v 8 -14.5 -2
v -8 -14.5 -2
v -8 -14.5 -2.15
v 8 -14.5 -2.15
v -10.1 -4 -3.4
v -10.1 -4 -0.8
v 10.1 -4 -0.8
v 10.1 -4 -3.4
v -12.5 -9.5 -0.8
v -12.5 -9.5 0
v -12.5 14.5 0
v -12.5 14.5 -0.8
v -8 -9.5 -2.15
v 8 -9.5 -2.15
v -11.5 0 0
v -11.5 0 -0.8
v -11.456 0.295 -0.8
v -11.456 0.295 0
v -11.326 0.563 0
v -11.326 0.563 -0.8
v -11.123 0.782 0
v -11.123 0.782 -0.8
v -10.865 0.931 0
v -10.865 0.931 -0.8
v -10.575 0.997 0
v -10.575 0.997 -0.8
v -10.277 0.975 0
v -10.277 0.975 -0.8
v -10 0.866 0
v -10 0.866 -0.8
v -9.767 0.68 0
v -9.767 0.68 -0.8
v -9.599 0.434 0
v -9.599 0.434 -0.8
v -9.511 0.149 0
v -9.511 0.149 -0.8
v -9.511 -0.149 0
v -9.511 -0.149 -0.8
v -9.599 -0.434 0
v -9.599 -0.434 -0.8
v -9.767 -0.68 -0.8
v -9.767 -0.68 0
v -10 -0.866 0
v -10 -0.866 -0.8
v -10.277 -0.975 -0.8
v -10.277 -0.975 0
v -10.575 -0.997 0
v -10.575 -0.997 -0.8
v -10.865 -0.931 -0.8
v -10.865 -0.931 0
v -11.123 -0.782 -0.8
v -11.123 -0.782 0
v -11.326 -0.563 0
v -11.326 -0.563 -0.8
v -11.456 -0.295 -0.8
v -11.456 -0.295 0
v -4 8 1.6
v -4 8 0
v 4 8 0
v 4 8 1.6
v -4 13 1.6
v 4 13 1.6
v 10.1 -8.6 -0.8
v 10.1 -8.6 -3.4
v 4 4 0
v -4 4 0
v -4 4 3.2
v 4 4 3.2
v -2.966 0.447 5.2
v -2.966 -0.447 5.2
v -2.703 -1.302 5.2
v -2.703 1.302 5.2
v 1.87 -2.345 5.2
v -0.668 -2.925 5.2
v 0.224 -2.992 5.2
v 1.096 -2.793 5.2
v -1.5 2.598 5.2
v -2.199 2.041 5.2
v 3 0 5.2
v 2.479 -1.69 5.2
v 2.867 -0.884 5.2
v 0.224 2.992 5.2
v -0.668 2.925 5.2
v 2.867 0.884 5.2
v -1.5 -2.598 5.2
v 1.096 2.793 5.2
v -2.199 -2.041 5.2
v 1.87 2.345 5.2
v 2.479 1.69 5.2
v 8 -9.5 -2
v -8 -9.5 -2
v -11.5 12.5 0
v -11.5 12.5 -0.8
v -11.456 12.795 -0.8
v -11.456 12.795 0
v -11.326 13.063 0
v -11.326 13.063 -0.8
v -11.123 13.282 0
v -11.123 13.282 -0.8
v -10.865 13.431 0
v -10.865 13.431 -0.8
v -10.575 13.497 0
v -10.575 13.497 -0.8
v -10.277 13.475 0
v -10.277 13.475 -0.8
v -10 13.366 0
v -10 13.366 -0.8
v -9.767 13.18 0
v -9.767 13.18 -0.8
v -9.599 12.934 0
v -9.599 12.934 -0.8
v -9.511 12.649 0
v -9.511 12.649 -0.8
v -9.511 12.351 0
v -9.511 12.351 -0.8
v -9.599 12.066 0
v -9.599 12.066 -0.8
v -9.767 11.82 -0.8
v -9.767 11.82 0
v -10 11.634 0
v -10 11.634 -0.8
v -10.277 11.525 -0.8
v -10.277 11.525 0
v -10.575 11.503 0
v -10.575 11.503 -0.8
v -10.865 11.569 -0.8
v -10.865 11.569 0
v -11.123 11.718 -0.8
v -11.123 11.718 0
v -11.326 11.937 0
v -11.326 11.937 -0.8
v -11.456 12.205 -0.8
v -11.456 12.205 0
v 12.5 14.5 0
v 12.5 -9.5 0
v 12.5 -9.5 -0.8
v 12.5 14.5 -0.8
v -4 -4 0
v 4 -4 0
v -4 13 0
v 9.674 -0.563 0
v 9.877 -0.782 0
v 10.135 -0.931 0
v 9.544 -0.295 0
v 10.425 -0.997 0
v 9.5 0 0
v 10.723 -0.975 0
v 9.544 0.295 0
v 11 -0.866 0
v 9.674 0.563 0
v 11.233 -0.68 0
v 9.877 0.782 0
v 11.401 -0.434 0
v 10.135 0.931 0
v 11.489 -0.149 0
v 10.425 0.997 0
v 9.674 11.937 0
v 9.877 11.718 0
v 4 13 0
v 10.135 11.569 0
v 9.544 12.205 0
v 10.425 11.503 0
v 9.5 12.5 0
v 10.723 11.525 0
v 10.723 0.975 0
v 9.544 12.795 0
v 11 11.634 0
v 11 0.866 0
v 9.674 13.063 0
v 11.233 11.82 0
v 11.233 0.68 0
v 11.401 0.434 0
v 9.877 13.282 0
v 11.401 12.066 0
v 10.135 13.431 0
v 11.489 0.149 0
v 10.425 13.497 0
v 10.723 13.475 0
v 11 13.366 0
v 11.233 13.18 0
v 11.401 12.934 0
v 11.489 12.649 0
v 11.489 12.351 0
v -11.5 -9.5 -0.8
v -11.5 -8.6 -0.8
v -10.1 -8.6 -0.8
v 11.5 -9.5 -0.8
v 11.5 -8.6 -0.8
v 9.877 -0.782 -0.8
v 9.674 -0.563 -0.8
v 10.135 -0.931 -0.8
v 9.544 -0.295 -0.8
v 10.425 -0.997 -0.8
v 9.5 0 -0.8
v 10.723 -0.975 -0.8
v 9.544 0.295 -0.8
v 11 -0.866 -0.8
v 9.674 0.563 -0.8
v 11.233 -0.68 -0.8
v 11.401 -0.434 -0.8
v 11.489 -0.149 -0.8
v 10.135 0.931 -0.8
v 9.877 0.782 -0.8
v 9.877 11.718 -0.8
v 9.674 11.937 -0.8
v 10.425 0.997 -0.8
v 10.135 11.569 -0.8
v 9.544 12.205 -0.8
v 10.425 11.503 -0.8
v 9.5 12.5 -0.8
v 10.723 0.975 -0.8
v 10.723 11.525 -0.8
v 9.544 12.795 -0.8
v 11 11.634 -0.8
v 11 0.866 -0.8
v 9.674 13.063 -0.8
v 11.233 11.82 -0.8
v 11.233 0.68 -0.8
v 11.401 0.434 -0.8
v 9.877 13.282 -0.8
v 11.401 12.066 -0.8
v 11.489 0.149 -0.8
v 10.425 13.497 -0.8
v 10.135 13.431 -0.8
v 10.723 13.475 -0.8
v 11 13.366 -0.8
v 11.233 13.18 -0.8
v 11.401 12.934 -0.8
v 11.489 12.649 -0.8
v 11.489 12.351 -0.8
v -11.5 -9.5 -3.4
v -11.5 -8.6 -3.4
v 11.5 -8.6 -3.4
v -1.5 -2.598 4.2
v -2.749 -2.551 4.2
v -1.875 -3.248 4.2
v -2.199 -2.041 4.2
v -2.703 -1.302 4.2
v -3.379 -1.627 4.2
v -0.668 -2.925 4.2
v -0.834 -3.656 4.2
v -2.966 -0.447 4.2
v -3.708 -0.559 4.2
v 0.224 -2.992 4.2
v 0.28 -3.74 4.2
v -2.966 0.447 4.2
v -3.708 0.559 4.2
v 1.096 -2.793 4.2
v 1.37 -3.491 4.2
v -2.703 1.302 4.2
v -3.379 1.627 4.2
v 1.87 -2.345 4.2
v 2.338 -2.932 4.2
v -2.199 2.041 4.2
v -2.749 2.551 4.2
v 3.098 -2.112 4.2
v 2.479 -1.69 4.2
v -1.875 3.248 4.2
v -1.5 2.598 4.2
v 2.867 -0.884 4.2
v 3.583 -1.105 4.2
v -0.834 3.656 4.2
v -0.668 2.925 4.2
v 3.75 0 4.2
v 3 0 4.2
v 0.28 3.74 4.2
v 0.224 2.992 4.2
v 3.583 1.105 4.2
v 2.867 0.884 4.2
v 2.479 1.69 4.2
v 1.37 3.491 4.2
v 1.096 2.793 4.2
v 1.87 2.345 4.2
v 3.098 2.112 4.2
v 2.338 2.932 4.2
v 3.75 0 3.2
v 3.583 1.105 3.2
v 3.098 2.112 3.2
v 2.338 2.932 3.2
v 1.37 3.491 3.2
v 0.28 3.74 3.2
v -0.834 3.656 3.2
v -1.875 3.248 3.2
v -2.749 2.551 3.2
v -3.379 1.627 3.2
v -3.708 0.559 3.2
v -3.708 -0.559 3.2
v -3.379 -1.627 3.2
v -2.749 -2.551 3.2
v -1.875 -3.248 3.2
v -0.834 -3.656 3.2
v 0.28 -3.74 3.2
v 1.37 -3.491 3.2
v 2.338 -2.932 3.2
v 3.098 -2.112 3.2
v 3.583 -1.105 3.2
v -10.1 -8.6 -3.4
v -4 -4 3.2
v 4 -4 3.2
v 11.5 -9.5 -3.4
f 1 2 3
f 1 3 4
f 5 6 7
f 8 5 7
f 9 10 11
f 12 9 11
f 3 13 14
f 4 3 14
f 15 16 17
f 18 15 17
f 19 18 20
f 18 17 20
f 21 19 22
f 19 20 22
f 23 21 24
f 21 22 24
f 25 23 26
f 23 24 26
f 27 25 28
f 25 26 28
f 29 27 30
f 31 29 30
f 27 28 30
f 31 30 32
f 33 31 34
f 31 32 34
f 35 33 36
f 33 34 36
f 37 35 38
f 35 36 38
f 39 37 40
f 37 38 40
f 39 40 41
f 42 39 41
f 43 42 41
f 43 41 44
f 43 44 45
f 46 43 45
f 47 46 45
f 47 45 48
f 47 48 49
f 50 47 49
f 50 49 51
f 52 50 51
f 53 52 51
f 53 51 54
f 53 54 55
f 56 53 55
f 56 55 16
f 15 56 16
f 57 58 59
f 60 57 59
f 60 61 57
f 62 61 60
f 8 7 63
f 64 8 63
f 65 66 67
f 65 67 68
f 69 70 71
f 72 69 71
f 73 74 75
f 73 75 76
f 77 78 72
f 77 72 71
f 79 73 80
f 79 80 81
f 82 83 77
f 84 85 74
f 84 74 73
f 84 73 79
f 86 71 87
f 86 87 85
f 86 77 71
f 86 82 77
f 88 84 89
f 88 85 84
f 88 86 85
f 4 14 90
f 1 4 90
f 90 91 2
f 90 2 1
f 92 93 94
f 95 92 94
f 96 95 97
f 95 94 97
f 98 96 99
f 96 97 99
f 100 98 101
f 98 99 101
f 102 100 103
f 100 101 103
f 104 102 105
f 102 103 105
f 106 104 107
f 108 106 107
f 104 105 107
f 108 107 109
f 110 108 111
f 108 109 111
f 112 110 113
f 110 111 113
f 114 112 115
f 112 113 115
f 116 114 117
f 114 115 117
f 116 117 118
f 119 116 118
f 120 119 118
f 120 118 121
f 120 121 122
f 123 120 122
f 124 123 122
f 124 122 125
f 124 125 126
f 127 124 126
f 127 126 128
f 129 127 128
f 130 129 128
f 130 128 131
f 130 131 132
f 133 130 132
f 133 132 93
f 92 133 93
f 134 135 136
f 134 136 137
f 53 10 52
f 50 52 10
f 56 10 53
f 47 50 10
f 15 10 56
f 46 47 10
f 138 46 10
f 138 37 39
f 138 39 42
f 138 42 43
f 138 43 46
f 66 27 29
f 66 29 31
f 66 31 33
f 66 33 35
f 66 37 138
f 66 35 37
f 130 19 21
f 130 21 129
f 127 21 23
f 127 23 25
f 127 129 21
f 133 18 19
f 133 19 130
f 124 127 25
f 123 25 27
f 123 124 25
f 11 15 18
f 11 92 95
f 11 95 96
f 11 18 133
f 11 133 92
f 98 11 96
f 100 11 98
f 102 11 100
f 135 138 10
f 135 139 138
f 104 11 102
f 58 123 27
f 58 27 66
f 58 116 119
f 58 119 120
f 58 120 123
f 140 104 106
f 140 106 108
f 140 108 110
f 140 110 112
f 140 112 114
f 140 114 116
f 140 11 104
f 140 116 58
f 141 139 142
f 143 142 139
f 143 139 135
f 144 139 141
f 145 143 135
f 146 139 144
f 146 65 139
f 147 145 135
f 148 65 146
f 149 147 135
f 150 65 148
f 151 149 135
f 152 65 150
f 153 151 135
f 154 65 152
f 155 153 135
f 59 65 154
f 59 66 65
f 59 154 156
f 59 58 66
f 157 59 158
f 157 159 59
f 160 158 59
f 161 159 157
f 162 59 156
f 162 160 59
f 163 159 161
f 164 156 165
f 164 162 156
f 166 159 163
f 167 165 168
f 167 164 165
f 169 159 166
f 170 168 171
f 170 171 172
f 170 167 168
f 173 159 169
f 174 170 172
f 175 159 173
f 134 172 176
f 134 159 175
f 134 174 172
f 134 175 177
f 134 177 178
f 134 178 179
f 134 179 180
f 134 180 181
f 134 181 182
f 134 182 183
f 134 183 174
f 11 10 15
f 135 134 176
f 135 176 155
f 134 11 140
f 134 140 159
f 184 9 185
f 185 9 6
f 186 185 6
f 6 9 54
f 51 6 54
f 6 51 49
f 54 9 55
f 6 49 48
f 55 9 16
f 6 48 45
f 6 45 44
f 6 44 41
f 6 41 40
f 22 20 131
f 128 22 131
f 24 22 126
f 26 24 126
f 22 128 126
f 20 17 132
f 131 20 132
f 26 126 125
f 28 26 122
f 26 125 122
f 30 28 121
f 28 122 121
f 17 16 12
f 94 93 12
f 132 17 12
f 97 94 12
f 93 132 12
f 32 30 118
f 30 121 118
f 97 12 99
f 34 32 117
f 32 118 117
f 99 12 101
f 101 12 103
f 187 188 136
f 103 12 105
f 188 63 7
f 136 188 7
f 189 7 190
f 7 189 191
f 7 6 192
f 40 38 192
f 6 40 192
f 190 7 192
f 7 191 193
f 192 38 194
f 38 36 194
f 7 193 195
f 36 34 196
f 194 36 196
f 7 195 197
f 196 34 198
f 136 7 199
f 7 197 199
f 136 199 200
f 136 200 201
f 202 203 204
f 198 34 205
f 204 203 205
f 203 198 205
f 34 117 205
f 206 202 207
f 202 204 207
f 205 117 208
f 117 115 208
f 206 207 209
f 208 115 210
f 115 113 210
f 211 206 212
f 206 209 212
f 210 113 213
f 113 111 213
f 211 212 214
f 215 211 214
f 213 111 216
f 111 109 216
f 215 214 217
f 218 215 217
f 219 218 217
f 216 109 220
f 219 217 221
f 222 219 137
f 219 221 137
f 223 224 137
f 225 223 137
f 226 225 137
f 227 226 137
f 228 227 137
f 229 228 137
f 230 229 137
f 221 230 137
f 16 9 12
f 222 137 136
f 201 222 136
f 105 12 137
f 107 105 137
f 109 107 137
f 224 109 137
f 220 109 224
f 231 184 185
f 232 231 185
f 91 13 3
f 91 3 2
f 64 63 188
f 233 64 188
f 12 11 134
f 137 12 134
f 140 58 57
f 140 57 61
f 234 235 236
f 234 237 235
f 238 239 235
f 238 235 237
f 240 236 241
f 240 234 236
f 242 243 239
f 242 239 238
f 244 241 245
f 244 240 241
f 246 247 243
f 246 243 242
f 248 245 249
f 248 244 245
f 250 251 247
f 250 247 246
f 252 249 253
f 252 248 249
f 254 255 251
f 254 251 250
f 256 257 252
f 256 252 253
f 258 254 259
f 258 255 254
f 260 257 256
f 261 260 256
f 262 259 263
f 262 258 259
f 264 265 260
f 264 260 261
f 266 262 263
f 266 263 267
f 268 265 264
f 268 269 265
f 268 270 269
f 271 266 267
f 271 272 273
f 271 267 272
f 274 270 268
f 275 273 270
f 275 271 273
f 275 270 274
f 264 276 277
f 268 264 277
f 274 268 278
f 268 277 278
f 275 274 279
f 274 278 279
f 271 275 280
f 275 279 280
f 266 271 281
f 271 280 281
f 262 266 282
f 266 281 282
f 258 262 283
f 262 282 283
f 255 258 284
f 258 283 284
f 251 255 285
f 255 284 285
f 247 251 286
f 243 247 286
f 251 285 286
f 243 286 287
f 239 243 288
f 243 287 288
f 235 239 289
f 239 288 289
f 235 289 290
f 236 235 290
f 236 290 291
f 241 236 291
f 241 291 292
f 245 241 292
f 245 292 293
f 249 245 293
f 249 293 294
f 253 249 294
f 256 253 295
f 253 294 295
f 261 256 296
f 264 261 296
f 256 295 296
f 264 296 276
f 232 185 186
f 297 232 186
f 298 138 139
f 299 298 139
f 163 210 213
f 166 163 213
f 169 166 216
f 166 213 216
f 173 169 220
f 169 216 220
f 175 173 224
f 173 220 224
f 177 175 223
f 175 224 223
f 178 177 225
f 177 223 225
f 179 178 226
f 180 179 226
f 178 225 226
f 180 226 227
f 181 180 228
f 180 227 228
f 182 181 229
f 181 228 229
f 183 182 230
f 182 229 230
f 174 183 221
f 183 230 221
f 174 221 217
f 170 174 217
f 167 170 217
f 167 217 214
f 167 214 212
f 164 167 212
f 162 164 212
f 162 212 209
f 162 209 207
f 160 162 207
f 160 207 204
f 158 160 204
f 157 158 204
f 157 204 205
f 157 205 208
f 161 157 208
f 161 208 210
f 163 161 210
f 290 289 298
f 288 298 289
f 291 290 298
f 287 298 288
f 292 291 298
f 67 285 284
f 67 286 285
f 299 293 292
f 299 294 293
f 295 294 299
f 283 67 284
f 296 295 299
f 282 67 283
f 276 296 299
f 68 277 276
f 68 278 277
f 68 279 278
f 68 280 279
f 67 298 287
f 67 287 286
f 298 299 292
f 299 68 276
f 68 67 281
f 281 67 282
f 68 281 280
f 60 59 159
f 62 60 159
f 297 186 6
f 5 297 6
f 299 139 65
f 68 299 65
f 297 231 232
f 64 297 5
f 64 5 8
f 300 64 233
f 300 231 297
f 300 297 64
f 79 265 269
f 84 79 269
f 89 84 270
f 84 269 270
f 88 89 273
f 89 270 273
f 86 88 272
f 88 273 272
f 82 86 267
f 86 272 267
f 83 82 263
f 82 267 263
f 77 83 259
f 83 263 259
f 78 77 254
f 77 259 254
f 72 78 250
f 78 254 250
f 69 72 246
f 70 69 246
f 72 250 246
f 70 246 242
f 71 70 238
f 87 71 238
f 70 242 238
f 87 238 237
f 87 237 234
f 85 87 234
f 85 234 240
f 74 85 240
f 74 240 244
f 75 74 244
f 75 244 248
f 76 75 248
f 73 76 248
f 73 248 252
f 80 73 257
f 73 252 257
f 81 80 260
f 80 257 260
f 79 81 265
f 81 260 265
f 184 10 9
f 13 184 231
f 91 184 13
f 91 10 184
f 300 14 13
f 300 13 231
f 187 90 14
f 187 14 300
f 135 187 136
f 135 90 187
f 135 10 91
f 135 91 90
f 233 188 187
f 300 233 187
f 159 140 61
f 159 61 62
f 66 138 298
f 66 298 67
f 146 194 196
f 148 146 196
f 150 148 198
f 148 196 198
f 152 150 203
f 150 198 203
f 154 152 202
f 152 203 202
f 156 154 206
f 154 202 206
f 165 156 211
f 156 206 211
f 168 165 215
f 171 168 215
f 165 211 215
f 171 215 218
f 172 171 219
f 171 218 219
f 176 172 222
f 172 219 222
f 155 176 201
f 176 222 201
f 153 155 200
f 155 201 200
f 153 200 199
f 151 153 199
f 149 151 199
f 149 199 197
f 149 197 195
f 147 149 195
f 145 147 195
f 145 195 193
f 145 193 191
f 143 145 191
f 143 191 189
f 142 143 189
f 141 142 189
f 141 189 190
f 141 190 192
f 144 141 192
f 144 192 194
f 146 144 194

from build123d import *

# Parameters (mm, degrees)
F0_W      = 25
F0_H      = 24
F1_DEPTH  = 0.8
F2_W      = 8
F2_H      = 8
F3_DEPTH  = 3.2
F4_R      = 3.75
F5_DEPTH  = 1
F6_R      = 3
F7_DEPTH  = 1
F9_D      = 2
F10_W     = 8
F10_H     = 5
F11_DEPTH = 1.6
F13_DEPTH = 2.6
F14_W     = 16
F14_H     = 0.15
F15_DEPTH = 5


with BuildPart() as f1:
    # F0 (on Top) → F1 (new body)
    with BuildSketch(Plane.XY):
        with Locations((0, 2.5)):
            Rectangle(F0_W, F0_H)
    extrude(amount=-F1_DEPTH)

    # F2 (on face) → F3 (join)
    with BuildSketch(Plane.XY):
        Rectangle(F2_W, F2_H)
    extrude(amount=F3_DEPTH)

    # F4 (on face) → F5 (join)
    with BuildSketch(Plane.XY.offset(3.2)):
        Circle(F4_R)
    extrude(amount=F5_DEPTH)

    # F6 (on face) → F7 (join)
    with BuildSketch(Plane.XY.offset(4.2)):
        Circle(F6_R)
    extrude(amount=F7_DEPTH)

    # F9 (through all)
    with Locations(Plane.XY):
        with Locations((-10.5, 12.5), (10.5, 12.5), (10.5, 0), (-10.5, 0)):
            Hole(F9_D / 2)

    # F10 (on face) → F11 (join)
    with BuildSketch(Plane.XY):
        with Locations((0, 10.5)):
            Rectangle(F10_W, F10_H)
    extrude(amount=F11_DEPTH)

    # F12 (on face) → F13 (join)
    with BuildSketch(Plane(origin=(0, 0, -0.8), x_dir=(1, 0, 0), z_dir=(0, 0, -1))):
        Polygon((11.5, 9.5), (-11.5, 9.5), (-11.5, 8.6), (-10.1, 8.6), (-10.1, 4), (10.1, 4), (10.1, 8.6), (11.5, 8.6), align=None)
    extrude(amount=F13_DEPTH)

    # F14 (on face) → F15 (join)
    with BuildSketch(Plane.XZ.offset(9.5)):
        with Locations((0, -2.075)):
            Rectangle(F14_W, F14_H)
    extrude(amount=F15_DEPTH)


solid = f1.part
